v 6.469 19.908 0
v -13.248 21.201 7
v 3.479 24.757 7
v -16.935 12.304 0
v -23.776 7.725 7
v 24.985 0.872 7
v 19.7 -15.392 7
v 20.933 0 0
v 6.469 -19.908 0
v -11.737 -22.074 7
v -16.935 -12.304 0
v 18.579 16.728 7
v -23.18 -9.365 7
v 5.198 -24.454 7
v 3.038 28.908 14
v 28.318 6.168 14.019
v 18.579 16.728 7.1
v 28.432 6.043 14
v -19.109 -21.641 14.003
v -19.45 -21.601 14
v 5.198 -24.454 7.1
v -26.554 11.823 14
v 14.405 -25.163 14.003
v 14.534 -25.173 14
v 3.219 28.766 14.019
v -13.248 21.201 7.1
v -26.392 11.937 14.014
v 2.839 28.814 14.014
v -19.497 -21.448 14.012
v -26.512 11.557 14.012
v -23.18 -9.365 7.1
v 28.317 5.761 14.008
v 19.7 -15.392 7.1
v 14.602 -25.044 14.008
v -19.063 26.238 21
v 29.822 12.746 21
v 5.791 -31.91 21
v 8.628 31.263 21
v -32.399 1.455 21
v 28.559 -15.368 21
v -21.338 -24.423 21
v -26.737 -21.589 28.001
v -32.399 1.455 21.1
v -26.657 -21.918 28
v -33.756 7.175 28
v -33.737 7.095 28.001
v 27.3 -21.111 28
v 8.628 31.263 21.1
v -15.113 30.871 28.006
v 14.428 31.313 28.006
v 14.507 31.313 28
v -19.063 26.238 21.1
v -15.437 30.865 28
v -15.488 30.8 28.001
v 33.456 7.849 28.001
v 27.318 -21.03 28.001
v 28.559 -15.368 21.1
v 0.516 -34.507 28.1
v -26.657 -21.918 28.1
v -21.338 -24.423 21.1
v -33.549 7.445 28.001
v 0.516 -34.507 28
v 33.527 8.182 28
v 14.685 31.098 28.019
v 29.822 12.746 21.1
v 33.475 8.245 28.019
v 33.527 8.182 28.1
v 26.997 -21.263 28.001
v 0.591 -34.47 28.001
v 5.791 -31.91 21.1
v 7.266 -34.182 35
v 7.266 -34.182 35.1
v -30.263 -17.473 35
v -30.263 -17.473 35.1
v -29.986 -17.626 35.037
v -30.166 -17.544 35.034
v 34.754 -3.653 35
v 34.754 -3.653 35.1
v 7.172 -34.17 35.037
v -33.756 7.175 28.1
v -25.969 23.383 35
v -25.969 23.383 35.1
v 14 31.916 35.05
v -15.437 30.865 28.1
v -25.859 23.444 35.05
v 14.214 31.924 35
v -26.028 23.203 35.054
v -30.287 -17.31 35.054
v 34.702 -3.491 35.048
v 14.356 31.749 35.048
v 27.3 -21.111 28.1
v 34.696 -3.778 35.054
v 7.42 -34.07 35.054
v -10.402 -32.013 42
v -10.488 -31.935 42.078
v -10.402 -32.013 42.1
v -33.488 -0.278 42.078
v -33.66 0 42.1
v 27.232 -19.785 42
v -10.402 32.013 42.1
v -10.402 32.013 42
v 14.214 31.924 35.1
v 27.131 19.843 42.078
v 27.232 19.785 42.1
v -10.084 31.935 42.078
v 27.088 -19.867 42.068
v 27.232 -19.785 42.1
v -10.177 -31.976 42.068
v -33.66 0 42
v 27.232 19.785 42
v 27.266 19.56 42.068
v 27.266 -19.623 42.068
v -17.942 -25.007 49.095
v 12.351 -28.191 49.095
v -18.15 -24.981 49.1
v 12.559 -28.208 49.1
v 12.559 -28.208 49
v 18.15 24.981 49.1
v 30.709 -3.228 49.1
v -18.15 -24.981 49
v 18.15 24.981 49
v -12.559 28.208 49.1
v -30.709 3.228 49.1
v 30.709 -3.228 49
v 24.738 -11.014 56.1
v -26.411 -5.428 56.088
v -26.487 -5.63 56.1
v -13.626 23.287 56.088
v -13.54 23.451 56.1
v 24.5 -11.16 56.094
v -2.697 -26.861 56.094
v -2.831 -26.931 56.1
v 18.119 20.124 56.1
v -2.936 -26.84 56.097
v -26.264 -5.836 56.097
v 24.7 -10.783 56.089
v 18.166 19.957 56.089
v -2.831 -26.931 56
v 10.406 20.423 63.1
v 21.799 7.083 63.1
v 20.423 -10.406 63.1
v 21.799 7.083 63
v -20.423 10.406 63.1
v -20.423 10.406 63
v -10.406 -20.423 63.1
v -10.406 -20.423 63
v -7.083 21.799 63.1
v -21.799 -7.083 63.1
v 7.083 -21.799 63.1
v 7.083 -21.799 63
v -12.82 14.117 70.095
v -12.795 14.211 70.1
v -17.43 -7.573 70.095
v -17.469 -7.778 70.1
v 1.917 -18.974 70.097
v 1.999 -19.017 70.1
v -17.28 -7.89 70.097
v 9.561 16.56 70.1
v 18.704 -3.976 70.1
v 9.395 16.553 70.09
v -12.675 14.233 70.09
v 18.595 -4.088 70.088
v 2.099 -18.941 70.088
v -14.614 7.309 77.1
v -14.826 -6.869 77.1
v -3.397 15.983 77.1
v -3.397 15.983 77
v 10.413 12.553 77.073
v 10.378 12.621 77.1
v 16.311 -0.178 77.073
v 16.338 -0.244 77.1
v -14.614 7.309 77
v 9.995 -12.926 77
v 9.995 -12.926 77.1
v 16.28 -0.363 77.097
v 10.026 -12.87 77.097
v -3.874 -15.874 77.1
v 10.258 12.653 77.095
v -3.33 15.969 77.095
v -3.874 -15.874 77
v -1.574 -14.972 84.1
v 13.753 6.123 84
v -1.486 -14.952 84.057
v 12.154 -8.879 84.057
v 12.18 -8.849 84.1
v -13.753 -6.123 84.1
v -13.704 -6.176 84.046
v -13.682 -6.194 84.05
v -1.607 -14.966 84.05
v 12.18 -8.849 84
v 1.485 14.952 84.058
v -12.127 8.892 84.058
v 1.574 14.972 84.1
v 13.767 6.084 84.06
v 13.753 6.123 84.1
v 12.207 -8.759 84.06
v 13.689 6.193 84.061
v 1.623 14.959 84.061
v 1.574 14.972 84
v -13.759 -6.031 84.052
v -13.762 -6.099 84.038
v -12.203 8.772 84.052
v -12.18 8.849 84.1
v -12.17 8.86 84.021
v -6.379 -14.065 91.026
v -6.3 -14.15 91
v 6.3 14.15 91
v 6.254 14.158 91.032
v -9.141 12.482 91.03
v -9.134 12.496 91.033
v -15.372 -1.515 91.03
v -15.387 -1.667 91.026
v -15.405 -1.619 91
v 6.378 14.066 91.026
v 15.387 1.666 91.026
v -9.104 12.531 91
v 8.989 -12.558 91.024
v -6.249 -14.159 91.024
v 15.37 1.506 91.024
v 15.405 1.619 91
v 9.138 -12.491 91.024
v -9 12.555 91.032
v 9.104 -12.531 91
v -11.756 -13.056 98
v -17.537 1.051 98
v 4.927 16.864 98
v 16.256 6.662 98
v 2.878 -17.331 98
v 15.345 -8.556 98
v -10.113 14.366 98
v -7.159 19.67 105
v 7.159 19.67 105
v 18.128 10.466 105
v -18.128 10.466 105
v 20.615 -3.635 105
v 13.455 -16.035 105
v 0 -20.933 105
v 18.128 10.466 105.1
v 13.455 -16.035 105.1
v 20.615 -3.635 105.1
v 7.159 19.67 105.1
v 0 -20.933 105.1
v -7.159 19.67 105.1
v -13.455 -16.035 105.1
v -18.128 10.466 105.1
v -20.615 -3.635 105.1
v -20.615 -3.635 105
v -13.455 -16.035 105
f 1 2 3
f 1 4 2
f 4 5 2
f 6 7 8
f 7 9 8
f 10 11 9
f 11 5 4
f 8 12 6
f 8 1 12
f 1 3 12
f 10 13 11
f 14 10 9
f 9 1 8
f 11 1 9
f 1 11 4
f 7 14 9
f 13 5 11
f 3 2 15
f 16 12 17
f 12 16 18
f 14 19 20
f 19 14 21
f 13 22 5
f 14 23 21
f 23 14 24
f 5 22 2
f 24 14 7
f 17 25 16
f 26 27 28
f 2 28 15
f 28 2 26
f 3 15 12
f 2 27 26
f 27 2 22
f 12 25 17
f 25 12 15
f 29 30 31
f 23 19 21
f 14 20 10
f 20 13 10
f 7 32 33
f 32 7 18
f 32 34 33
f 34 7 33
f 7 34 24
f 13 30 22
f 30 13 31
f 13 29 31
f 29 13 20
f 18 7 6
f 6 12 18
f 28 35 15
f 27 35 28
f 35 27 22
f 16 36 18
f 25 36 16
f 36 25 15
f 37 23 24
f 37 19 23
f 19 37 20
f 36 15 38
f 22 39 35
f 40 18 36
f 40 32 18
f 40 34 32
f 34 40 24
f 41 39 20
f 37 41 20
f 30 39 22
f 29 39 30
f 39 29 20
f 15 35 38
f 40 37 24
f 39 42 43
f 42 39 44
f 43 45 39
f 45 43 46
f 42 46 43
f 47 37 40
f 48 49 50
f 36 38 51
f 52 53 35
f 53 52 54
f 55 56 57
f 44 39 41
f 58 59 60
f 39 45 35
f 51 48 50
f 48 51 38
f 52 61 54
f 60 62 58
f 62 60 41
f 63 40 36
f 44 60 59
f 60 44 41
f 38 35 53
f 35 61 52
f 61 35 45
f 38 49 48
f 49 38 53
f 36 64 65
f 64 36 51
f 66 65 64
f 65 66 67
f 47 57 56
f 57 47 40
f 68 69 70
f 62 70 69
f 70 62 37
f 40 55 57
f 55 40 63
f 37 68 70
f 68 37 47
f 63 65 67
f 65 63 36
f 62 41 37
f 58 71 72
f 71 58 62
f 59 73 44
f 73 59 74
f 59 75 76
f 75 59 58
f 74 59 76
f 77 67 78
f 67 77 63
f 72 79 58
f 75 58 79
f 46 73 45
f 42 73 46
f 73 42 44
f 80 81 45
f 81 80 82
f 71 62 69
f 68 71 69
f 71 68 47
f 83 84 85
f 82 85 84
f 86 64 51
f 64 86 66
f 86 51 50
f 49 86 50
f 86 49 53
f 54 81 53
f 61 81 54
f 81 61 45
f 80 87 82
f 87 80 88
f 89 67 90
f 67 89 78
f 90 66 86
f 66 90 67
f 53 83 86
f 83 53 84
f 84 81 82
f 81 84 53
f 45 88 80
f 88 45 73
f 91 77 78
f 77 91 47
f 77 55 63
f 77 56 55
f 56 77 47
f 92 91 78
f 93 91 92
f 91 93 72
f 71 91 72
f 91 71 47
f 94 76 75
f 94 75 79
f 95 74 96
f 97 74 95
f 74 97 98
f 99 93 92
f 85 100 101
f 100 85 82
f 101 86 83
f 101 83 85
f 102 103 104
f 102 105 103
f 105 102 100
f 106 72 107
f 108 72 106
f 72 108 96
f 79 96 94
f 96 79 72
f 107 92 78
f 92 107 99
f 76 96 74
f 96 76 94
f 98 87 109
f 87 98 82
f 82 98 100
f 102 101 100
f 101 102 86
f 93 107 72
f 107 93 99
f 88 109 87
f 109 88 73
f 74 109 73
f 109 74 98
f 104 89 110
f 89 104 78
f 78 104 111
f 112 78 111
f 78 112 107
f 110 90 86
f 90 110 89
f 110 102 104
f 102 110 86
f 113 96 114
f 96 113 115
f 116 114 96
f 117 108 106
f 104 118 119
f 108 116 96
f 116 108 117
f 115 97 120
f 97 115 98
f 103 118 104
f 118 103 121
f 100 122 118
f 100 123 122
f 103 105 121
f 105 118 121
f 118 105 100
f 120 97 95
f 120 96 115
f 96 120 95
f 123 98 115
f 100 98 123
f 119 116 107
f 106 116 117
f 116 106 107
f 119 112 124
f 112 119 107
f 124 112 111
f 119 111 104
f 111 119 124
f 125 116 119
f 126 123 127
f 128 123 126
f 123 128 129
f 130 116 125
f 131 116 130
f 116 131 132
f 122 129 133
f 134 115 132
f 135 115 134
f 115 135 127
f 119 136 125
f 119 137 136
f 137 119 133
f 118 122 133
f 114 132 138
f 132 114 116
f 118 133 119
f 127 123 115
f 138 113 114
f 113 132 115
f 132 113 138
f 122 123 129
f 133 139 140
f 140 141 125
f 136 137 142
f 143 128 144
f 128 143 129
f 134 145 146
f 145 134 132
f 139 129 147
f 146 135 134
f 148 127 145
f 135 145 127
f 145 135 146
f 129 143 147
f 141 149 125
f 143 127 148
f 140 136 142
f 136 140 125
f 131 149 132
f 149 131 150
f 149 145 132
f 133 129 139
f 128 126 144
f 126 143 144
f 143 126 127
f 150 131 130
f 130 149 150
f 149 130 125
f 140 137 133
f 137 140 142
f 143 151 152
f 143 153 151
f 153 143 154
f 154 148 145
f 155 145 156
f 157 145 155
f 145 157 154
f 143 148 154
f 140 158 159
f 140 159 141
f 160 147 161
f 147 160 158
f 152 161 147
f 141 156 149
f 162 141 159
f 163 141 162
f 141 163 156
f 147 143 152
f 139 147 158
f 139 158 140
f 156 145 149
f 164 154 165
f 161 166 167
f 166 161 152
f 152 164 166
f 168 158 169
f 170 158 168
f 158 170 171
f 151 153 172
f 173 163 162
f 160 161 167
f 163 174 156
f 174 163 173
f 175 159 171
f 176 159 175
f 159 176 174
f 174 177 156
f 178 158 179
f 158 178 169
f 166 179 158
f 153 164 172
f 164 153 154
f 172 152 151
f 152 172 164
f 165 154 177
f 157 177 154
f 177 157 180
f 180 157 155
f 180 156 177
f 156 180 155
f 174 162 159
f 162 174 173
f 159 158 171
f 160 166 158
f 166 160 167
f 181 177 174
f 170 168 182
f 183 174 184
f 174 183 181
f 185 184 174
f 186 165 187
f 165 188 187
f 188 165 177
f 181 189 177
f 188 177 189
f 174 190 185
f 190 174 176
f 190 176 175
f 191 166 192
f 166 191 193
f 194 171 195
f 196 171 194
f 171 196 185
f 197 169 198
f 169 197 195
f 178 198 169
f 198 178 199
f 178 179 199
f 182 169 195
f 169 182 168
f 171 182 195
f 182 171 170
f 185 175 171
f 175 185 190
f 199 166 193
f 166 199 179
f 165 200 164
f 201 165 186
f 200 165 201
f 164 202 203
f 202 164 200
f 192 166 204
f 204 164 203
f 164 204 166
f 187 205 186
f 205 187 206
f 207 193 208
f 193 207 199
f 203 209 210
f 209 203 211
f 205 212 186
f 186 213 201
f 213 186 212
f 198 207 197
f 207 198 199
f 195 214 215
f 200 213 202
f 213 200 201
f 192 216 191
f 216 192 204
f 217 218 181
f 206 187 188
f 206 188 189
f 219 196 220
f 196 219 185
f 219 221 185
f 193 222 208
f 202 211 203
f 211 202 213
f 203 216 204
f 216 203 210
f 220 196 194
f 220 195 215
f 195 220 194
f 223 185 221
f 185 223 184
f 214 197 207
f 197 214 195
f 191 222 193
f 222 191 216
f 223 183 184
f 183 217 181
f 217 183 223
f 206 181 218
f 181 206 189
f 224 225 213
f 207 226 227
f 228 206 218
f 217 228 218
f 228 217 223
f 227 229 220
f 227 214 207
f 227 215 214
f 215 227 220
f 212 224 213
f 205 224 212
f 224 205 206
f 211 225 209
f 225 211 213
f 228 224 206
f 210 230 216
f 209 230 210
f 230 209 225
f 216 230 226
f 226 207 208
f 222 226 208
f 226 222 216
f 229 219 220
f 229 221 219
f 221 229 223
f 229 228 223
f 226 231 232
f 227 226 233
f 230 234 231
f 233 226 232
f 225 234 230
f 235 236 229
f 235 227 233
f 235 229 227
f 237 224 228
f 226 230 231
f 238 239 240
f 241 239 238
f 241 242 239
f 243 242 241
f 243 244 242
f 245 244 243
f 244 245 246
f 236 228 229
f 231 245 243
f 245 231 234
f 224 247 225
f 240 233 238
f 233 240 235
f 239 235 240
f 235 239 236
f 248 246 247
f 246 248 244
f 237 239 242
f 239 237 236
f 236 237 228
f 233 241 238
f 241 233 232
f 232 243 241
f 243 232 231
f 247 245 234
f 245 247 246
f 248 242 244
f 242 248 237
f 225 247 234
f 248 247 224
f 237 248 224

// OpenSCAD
/*
	Tjark's low poly random sinus vase
	A parametric Vase with random cornercount per layer. Actually this model isn't a hollow body. You have to configure your 3D-slicer to "vase mode". Play around with the given parameters.
	Author: Tjark alias Shark
	Contact: www.thingiverse.com/SharkNado
	
	License: Public domain - do whatever you want (just please dont claim you made it)
    
    Version: 0.1	
*/

//Layers
layers = 15;  // [2:200]

//Layerheight
layerHeight = 7;

//Radius Offset
radiusOffset = 50;

//Amplitude
amp = 20;

//Random Seed
randSeed = 3;

//Rotation per layer
rotateZ=42;

//Phase Shift
phase = 0;

//Minimum Edges
minEdges = 5; //[3:100]

//Maximum Edges
maxEdges = 10; //[3:100]





fns=rands(minEdges,maxEdges,layers+1,randSeed);



for(h=[0:layers-1]){
    rgb(100/layers*(layers-h),20,100/layers*h)hull(){
        rotate([0,0,h*rotateZ]){
            translate([0,0,layerHeight*h])cylinder(d=dynamicRadius(h),h=0.1,$fn=fns[h]);
        }
        rotate([0,0,(h+1)*rotateZ]){
            translate([0,0,layerHeight*(h+1)]){
                cylinder(d=dynamicRadius(h+1),h=0.1,$fn=fns[h+1]);
            }
        }
       
    }
}
module rgb(r,g,b){
    color([r/100,g/100,b/100])children();
}

function dynamicRadius(h) = sin((h-1+phase)/(layers/2)*180)*amp+radiusOffset;
